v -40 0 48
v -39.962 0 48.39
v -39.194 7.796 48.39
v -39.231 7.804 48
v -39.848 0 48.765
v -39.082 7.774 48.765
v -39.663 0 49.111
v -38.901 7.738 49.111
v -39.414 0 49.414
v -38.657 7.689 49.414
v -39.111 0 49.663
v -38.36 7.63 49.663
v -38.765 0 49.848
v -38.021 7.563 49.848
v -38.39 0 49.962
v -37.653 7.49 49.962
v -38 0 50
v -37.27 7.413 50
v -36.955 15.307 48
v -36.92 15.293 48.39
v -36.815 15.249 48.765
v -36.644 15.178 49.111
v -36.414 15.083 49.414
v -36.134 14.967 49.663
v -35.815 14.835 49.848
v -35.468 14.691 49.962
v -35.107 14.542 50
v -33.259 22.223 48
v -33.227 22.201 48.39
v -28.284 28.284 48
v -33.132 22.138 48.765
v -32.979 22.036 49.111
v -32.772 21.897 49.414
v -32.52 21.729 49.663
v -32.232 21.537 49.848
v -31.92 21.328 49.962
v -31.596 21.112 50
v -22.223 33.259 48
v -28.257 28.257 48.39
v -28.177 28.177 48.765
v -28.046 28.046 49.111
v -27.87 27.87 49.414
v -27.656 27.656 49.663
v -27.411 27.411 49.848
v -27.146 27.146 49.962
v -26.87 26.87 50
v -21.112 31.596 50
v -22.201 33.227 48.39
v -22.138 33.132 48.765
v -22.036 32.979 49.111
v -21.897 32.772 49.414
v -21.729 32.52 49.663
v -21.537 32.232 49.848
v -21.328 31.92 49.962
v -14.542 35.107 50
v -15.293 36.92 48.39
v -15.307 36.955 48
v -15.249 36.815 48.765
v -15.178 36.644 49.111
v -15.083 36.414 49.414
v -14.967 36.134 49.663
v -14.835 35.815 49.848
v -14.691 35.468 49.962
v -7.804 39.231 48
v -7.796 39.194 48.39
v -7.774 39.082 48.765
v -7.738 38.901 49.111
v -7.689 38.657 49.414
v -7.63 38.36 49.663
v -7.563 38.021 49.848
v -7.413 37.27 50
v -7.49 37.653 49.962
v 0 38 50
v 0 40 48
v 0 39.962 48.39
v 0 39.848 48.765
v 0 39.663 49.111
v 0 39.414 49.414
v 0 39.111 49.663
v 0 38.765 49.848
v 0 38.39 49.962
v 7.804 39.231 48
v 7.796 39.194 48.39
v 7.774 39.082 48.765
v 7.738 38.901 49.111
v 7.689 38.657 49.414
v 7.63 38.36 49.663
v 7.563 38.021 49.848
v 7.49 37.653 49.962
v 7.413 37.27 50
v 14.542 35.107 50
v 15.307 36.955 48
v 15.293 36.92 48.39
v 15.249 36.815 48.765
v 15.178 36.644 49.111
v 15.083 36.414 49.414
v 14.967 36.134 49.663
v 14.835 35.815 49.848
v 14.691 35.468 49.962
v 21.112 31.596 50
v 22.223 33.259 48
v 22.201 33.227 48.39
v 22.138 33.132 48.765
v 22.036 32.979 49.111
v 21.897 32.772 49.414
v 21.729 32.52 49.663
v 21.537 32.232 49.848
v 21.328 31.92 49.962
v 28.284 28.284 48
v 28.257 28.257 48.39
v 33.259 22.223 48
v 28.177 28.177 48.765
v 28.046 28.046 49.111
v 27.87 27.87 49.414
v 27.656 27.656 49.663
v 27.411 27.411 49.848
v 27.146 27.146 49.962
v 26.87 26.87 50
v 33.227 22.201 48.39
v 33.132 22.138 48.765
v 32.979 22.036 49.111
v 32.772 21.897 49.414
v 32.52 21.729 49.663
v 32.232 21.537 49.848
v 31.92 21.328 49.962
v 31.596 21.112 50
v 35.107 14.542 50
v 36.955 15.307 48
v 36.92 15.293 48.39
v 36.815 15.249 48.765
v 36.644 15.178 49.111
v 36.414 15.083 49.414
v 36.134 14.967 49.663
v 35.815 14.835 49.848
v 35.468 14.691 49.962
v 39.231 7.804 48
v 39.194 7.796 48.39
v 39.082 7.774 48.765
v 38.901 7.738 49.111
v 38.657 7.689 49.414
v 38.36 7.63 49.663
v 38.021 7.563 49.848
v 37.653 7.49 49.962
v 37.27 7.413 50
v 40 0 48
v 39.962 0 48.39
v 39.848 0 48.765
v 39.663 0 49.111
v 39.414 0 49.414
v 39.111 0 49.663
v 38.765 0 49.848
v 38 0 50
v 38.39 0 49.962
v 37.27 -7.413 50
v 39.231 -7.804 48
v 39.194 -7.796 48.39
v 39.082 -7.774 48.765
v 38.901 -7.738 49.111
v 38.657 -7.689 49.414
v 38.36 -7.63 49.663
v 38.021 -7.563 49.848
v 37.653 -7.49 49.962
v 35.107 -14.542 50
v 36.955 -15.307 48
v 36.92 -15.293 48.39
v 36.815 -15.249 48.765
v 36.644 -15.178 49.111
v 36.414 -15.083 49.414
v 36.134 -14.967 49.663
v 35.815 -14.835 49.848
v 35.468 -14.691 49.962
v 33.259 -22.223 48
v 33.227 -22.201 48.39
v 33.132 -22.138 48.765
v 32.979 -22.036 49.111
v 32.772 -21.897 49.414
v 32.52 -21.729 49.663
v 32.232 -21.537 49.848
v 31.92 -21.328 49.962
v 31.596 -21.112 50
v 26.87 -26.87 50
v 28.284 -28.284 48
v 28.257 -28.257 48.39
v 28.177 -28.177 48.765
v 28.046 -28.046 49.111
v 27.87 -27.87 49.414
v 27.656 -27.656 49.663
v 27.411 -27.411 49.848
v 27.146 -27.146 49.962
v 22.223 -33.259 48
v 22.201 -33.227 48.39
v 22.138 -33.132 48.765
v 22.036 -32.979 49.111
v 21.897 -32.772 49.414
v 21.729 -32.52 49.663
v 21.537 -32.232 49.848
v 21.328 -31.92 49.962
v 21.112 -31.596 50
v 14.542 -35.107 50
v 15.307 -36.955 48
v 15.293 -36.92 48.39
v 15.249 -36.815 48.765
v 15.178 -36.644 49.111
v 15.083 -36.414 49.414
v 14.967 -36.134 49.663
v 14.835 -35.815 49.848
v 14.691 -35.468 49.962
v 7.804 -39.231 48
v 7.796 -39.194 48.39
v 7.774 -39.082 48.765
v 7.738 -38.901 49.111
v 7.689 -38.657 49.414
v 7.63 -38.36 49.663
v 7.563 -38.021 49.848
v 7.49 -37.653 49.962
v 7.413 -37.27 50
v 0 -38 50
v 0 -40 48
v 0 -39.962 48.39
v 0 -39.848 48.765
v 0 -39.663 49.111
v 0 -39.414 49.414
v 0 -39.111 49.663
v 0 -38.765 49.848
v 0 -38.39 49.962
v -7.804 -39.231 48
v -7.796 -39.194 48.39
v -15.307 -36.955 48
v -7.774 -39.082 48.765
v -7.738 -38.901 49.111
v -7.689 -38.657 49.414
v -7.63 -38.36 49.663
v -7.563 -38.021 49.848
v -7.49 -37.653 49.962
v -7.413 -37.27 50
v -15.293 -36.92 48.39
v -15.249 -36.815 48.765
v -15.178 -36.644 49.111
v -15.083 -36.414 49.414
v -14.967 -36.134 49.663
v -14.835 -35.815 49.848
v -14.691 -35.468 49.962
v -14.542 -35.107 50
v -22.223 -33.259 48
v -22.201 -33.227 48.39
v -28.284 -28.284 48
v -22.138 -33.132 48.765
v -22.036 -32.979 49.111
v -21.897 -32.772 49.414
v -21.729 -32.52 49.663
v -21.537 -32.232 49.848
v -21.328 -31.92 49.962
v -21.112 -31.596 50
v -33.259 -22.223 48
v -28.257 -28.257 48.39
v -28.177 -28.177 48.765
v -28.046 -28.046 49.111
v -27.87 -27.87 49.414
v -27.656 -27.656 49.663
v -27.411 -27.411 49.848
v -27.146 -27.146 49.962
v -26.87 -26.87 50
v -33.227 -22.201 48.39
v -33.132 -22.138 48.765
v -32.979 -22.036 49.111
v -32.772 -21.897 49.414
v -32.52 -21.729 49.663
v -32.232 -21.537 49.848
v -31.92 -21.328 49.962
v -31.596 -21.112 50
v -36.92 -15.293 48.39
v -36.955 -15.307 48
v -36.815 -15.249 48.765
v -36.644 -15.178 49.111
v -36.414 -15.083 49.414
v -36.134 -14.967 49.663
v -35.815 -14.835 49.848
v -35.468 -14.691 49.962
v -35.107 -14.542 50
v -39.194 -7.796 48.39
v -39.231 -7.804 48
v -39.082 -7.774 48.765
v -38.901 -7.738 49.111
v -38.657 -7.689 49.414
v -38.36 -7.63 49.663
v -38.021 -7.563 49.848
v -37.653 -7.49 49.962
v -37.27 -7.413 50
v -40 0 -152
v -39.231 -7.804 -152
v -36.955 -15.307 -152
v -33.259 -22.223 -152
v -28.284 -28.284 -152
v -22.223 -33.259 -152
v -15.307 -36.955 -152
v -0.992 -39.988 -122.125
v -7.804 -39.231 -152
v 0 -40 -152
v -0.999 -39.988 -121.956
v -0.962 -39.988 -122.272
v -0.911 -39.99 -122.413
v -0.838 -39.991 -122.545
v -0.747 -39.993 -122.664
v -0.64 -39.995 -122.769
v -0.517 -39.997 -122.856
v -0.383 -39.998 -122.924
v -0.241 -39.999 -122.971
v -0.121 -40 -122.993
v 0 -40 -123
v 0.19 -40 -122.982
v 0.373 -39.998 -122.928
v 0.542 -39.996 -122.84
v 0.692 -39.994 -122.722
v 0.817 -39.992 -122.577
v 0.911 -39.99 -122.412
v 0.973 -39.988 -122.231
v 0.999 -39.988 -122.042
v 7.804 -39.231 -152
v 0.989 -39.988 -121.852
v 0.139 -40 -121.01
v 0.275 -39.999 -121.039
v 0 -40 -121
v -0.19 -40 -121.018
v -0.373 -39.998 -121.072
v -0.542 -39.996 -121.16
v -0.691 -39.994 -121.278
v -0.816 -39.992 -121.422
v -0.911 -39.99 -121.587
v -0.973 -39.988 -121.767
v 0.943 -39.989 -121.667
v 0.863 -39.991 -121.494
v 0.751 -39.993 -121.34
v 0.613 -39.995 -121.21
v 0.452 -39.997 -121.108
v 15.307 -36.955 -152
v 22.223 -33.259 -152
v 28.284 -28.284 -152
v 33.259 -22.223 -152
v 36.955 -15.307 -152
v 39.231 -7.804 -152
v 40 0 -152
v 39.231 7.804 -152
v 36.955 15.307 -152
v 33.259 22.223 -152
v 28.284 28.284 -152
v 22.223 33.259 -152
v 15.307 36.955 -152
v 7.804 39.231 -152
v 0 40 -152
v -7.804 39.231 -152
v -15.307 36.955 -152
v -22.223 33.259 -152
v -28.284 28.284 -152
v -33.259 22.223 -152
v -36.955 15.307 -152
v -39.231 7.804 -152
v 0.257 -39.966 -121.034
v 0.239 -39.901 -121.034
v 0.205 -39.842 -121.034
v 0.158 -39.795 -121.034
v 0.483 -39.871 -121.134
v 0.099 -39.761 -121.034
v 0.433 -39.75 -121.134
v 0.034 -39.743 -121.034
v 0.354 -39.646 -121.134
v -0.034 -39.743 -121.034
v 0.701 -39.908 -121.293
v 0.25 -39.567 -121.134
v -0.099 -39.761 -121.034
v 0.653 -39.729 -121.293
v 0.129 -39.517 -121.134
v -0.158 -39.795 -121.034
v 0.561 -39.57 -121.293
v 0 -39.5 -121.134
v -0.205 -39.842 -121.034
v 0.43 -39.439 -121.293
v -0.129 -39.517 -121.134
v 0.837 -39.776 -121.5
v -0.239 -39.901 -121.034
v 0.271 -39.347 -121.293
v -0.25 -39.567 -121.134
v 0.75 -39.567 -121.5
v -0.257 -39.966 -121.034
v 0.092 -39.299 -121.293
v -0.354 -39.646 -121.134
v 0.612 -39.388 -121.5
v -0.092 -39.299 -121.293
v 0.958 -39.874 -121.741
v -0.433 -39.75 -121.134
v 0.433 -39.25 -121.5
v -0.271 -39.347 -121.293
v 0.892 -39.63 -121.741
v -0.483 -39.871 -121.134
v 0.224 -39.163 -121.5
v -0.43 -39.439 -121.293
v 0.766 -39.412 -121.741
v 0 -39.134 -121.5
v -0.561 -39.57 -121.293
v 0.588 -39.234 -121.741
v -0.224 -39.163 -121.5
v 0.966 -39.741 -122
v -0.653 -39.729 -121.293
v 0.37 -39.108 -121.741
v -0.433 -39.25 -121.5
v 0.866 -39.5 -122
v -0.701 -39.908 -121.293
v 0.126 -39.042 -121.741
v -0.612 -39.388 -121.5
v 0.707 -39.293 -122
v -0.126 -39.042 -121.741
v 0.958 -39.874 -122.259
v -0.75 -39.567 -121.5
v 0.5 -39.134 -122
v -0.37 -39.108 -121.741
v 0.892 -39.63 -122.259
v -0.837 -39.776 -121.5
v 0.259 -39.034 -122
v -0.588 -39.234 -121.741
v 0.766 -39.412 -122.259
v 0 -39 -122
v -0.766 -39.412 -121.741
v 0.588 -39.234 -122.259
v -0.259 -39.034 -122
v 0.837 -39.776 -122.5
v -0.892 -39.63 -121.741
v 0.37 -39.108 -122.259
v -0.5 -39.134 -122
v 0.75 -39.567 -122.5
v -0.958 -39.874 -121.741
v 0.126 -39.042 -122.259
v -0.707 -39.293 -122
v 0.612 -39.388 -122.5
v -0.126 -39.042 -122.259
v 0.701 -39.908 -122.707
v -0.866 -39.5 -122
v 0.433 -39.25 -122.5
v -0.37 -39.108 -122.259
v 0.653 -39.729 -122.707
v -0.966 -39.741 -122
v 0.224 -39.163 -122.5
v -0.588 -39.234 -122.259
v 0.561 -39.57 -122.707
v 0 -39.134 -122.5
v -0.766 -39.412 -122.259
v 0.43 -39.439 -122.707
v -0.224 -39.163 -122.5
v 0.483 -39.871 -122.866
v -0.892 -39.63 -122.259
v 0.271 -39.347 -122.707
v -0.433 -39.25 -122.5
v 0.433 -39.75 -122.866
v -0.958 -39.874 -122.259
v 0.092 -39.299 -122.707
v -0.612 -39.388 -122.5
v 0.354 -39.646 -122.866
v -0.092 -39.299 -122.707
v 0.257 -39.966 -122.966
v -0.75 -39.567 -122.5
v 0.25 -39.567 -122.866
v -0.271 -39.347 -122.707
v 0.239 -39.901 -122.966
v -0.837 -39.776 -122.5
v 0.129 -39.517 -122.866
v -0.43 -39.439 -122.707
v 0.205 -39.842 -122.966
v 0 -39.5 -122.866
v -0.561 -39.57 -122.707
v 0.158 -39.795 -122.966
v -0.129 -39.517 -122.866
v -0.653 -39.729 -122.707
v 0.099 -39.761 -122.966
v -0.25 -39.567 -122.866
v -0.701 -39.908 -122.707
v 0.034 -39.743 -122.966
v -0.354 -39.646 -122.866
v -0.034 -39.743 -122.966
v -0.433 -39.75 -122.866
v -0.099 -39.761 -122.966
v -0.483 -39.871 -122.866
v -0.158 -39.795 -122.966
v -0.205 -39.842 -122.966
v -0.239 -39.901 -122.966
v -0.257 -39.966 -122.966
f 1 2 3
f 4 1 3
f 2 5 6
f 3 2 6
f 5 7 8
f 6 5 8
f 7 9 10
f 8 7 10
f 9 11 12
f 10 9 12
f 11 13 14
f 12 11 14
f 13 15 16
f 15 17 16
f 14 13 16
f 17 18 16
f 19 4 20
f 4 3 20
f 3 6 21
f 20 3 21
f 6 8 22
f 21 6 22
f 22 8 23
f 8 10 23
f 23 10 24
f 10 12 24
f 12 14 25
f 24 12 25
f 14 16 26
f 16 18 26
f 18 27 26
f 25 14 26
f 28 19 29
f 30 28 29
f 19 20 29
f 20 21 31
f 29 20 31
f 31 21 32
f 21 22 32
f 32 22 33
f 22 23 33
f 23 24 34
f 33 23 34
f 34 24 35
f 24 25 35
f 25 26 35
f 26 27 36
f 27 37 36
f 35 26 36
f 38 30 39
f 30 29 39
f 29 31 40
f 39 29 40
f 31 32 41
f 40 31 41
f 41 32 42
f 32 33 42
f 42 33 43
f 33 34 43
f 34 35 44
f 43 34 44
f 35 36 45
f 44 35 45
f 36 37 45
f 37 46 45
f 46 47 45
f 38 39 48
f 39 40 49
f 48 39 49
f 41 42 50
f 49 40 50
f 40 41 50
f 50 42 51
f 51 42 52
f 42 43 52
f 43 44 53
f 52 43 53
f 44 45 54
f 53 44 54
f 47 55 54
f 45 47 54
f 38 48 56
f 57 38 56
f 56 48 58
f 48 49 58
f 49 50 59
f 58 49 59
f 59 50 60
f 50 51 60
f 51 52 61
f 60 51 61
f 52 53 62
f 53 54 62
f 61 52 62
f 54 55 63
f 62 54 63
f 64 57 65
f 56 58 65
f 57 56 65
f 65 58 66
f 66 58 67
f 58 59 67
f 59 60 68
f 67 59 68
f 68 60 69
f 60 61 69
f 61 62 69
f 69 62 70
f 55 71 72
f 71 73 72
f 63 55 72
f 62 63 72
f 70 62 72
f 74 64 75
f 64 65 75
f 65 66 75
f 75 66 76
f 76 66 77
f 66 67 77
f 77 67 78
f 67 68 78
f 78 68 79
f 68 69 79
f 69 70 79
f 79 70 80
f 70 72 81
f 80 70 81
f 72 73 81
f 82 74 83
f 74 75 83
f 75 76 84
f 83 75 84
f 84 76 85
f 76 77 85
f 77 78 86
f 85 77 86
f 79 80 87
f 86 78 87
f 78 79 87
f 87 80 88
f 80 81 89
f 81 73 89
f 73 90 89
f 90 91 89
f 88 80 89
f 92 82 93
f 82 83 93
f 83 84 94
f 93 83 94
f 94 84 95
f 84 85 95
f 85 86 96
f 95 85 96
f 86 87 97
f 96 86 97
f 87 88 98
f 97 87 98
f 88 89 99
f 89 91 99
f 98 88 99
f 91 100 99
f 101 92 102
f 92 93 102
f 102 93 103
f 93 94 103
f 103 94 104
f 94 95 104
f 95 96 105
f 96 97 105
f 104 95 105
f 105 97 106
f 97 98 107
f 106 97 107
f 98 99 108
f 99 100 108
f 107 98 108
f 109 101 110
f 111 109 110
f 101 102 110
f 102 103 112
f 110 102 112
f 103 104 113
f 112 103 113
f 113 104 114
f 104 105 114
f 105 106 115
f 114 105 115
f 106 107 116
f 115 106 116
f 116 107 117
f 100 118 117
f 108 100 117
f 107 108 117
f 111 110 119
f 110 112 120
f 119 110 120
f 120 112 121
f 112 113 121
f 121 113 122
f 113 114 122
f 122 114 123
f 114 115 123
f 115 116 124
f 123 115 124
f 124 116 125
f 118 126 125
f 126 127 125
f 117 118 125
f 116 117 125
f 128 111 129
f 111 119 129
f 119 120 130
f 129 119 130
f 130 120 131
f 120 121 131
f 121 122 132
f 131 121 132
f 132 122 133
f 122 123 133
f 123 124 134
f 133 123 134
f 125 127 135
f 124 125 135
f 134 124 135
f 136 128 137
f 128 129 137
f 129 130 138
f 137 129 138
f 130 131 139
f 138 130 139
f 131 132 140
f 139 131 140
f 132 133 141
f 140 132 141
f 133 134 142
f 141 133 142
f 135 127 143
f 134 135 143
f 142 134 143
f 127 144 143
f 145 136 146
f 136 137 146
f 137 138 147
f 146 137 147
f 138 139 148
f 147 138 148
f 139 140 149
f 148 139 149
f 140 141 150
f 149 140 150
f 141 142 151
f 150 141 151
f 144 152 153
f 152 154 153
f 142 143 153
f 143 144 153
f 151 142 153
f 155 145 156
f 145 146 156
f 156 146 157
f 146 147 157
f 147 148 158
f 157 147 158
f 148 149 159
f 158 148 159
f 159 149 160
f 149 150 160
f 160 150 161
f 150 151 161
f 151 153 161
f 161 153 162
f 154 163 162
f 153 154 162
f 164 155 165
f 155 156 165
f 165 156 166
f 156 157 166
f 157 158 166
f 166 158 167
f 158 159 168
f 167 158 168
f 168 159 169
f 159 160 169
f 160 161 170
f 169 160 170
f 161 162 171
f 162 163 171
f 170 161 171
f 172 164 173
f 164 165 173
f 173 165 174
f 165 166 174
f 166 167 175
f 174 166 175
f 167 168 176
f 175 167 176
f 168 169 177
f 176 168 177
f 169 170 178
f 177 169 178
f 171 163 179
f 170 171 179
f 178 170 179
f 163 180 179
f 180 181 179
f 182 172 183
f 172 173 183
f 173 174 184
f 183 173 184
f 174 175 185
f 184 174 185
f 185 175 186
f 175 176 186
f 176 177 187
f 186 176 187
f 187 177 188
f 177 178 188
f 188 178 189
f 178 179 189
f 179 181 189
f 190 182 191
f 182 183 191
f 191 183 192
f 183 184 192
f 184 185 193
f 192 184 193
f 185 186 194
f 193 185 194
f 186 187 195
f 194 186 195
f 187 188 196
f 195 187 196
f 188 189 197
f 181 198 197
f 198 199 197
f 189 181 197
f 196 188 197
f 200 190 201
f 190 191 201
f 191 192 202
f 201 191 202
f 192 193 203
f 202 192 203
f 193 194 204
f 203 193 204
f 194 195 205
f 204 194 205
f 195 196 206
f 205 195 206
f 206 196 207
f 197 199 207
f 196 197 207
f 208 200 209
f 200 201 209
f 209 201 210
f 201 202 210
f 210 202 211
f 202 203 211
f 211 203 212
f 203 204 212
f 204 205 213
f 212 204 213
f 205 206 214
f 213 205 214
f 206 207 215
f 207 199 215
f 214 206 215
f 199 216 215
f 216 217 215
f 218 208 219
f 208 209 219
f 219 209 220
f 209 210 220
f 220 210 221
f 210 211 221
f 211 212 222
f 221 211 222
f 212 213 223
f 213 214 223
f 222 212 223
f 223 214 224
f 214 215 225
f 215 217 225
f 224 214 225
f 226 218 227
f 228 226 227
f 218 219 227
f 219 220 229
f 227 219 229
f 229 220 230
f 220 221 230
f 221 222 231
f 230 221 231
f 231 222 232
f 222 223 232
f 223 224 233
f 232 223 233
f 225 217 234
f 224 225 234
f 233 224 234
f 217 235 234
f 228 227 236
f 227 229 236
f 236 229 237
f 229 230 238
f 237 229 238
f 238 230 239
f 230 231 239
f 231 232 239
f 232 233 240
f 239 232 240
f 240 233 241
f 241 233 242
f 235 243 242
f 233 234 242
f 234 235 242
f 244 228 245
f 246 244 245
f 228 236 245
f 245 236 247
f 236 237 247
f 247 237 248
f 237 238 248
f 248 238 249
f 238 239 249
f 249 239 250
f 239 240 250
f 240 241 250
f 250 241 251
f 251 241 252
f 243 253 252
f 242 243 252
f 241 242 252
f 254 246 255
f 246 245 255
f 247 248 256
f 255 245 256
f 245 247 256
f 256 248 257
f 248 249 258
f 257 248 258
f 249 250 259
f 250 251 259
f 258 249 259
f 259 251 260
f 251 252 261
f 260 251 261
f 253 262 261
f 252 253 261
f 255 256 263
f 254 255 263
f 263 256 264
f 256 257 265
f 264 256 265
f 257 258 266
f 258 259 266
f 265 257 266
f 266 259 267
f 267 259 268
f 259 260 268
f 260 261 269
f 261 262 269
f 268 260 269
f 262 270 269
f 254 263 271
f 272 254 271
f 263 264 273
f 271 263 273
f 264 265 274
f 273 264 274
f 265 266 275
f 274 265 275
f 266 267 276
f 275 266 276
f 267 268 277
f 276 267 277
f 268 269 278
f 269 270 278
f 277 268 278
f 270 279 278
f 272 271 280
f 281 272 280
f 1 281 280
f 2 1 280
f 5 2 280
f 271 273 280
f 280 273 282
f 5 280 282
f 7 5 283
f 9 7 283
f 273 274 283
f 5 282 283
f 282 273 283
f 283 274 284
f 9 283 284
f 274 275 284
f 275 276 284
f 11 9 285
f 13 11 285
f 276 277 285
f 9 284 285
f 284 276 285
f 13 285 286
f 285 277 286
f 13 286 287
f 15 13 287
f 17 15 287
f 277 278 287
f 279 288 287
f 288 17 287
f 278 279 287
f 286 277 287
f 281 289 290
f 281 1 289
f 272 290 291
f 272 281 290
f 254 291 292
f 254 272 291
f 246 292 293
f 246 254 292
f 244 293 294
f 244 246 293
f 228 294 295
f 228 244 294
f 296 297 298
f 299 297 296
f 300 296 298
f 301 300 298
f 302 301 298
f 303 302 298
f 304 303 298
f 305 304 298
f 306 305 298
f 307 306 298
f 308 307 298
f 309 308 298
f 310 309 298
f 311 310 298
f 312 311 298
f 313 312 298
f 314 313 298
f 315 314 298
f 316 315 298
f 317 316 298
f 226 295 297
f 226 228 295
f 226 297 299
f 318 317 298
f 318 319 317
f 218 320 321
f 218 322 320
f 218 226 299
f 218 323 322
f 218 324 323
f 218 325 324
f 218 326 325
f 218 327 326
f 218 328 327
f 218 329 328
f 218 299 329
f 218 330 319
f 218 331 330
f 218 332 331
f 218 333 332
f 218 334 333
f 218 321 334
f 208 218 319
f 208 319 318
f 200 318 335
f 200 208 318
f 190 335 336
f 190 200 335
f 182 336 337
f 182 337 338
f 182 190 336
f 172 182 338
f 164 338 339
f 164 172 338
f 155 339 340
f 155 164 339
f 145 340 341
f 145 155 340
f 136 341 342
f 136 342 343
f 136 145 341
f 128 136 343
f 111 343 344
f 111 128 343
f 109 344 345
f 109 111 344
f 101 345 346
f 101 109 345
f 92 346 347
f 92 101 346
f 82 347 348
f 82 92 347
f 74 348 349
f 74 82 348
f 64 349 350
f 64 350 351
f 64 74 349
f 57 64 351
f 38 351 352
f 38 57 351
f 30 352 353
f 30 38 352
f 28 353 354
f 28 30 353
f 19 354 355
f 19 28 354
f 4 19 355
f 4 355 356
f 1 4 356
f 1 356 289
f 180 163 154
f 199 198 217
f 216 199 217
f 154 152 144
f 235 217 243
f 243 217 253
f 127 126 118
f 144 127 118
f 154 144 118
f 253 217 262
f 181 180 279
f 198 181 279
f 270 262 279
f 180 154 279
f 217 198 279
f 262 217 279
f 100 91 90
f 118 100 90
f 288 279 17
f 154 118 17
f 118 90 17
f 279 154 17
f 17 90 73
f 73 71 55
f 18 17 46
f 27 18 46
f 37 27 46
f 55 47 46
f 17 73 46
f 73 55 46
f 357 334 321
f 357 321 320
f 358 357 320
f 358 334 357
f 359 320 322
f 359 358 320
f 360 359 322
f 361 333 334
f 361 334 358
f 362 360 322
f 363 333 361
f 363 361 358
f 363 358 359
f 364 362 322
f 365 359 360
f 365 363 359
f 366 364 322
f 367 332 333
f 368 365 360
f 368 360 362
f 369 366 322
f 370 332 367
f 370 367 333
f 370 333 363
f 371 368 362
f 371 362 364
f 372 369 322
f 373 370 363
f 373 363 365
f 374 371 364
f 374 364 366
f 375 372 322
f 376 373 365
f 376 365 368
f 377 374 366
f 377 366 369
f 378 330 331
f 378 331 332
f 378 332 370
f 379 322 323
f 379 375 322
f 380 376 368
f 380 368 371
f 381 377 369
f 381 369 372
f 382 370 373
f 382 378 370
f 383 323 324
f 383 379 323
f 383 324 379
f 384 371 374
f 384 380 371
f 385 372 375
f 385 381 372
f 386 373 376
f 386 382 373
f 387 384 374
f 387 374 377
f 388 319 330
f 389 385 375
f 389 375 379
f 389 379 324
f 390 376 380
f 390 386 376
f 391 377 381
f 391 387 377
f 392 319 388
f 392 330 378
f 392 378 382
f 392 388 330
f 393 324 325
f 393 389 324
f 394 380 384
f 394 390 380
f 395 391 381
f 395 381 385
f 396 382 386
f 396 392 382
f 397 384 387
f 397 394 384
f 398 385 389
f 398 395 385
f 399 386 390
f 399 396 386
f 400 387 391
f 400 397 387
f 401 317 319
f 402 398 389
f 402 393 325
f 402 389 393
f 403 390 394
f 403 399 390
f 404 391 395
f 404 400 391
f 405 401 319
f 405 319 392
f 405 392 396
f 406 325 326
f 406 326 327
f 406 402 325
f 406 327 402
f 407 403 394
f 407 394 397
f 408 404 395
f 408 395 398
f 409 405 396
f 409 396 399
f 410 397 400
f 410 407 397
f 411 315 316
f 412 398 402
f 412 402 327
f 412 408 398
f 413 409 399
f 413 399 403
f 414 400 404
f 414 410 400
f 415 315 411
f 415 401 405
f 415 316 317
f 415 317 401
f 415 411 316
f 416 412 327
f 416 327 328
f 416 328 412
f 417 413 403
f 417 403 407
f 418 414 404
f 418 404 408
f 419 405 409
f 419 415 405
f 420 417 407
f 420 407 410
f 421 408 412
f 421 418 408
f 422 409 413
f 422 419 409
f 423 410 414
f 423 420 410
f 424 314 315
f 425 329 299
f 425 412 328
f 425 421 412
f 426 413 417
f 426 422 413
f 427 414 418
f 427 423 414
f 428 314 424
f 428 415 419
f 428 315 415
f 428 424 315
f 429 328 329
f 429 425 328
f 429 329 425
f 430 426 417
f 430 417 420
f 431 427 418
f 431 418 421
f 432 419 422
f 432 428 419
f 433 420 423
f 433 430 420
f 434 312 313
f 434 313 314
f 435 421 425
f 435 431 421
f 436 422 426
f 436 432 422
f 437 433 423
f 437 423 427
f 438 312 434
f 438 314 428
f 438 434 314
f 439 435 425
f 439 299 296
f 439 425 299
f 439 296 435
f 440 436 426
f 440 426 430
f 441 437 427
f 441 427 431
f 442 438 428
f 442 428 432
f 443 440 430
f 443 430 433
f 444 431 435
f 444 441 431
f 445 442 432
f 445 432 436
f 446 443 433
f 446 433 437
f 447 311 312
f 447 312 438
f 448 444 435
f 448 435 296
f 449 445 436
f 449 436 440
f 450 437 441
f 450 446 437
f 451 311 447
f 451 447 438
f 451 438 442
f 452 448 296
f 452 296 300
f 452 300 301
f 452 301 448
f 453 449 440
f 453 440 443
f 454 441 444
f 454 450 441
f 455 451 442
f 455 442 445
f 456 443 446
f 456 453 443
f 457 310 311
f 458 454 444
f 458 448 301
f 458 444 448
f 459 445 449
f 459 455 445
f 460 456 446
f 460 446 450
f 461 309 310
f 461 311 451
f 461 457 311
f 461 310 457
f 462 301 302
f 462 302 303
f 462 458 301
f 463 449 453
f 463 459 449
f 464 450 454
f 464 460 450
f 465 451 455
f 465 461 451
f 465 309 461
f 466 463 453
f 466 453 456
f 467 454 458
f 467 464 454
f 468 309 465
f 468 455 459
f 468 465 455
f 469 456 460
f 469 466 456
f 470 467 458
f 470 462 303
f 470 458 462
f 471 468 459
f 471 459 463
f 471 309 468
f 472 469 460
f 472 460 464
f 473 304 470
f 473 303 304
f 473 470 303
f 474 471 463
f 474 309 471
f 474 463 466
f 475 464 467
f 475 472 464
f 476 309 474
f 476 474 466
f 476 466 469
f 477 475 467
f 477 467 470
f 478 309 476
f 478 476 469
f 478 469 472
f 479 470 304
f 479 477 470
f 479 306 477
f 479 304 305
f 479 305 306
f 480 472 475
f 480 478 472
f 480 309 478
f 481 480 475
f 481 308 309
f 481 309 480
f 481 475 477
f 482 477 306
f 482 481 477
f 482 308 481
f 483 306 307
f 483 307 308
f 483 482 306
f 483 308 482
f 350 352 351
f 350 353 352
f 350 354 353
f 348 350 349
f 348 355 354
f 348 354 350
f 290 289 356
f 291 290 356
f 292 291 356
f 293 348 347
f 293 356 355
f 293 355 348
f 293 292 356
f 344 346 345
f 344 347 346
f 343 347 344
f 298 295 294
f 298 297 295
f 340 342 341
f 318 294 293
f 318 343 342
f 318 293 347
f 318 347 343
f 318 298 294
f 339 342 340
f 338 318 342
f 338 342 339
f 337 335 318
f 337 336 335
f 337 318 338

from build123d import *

# Parameters (mm, degrees)
F0_W     = 40
F0_H     = 50
F0_H_2   = 150
F3_R     = 2
F2_R     = 40
F4_DEPTH = 23
F7_DEPTH = 25


with BuildPart() as f1:
    # F0 (on Front) → F1 (revolve)
    with BuildSketch(Plane.XZ):
        with Locations((-20, 25)):
            Rectangle(F0_W, F0_H)
        with Locations((-20, -75)):
            Rectangle(F0_W, F0_H_2)
    revolve(axis=Axis((0, 0, -53.9682246745), (0, 0, -1)))

    # F3
    f3_edges = [f1.edges().sort_by_distance(p)[0] for p in [
        (40, 0, 50),
    ]]
    fillet(f3_edges, radius=F3_R)

    # F2 (on face) → F4 (cut)
    with BuildSketch(Plane(origin=(0, 0, -150), x_dir=(1, 0, 0), z_dir=(0, 0, -1))):
        Circle(F2_R)
    extrude(amount=-F4_DEPTH, mode=Mode.SUBTRACT)

    # F5 (on Right) → F6 (revolve, cut)
    with BuildSketch(Plane.YZ):
        with BuildLine():
            ThreePointArc((-40, -121), (-41, -122), (-40, -123))
            Line((-40, -123), (-40, -122))
            Line((-40, -122), (-40, -121))
        make_face()
    revolve(axis=Axis((0, -40, -39.5), (0, 0, 1)), mode=Mode.SUBTRACT)

    # F7 (add): a face of the model
    f7_faces = [f1.faces().sort_by_distance(p)[0] for p in [
        (0, 0, -127),
    ]]
    extrude(f7_faces, amount=F7_DEPTH)


solid = f1.part
